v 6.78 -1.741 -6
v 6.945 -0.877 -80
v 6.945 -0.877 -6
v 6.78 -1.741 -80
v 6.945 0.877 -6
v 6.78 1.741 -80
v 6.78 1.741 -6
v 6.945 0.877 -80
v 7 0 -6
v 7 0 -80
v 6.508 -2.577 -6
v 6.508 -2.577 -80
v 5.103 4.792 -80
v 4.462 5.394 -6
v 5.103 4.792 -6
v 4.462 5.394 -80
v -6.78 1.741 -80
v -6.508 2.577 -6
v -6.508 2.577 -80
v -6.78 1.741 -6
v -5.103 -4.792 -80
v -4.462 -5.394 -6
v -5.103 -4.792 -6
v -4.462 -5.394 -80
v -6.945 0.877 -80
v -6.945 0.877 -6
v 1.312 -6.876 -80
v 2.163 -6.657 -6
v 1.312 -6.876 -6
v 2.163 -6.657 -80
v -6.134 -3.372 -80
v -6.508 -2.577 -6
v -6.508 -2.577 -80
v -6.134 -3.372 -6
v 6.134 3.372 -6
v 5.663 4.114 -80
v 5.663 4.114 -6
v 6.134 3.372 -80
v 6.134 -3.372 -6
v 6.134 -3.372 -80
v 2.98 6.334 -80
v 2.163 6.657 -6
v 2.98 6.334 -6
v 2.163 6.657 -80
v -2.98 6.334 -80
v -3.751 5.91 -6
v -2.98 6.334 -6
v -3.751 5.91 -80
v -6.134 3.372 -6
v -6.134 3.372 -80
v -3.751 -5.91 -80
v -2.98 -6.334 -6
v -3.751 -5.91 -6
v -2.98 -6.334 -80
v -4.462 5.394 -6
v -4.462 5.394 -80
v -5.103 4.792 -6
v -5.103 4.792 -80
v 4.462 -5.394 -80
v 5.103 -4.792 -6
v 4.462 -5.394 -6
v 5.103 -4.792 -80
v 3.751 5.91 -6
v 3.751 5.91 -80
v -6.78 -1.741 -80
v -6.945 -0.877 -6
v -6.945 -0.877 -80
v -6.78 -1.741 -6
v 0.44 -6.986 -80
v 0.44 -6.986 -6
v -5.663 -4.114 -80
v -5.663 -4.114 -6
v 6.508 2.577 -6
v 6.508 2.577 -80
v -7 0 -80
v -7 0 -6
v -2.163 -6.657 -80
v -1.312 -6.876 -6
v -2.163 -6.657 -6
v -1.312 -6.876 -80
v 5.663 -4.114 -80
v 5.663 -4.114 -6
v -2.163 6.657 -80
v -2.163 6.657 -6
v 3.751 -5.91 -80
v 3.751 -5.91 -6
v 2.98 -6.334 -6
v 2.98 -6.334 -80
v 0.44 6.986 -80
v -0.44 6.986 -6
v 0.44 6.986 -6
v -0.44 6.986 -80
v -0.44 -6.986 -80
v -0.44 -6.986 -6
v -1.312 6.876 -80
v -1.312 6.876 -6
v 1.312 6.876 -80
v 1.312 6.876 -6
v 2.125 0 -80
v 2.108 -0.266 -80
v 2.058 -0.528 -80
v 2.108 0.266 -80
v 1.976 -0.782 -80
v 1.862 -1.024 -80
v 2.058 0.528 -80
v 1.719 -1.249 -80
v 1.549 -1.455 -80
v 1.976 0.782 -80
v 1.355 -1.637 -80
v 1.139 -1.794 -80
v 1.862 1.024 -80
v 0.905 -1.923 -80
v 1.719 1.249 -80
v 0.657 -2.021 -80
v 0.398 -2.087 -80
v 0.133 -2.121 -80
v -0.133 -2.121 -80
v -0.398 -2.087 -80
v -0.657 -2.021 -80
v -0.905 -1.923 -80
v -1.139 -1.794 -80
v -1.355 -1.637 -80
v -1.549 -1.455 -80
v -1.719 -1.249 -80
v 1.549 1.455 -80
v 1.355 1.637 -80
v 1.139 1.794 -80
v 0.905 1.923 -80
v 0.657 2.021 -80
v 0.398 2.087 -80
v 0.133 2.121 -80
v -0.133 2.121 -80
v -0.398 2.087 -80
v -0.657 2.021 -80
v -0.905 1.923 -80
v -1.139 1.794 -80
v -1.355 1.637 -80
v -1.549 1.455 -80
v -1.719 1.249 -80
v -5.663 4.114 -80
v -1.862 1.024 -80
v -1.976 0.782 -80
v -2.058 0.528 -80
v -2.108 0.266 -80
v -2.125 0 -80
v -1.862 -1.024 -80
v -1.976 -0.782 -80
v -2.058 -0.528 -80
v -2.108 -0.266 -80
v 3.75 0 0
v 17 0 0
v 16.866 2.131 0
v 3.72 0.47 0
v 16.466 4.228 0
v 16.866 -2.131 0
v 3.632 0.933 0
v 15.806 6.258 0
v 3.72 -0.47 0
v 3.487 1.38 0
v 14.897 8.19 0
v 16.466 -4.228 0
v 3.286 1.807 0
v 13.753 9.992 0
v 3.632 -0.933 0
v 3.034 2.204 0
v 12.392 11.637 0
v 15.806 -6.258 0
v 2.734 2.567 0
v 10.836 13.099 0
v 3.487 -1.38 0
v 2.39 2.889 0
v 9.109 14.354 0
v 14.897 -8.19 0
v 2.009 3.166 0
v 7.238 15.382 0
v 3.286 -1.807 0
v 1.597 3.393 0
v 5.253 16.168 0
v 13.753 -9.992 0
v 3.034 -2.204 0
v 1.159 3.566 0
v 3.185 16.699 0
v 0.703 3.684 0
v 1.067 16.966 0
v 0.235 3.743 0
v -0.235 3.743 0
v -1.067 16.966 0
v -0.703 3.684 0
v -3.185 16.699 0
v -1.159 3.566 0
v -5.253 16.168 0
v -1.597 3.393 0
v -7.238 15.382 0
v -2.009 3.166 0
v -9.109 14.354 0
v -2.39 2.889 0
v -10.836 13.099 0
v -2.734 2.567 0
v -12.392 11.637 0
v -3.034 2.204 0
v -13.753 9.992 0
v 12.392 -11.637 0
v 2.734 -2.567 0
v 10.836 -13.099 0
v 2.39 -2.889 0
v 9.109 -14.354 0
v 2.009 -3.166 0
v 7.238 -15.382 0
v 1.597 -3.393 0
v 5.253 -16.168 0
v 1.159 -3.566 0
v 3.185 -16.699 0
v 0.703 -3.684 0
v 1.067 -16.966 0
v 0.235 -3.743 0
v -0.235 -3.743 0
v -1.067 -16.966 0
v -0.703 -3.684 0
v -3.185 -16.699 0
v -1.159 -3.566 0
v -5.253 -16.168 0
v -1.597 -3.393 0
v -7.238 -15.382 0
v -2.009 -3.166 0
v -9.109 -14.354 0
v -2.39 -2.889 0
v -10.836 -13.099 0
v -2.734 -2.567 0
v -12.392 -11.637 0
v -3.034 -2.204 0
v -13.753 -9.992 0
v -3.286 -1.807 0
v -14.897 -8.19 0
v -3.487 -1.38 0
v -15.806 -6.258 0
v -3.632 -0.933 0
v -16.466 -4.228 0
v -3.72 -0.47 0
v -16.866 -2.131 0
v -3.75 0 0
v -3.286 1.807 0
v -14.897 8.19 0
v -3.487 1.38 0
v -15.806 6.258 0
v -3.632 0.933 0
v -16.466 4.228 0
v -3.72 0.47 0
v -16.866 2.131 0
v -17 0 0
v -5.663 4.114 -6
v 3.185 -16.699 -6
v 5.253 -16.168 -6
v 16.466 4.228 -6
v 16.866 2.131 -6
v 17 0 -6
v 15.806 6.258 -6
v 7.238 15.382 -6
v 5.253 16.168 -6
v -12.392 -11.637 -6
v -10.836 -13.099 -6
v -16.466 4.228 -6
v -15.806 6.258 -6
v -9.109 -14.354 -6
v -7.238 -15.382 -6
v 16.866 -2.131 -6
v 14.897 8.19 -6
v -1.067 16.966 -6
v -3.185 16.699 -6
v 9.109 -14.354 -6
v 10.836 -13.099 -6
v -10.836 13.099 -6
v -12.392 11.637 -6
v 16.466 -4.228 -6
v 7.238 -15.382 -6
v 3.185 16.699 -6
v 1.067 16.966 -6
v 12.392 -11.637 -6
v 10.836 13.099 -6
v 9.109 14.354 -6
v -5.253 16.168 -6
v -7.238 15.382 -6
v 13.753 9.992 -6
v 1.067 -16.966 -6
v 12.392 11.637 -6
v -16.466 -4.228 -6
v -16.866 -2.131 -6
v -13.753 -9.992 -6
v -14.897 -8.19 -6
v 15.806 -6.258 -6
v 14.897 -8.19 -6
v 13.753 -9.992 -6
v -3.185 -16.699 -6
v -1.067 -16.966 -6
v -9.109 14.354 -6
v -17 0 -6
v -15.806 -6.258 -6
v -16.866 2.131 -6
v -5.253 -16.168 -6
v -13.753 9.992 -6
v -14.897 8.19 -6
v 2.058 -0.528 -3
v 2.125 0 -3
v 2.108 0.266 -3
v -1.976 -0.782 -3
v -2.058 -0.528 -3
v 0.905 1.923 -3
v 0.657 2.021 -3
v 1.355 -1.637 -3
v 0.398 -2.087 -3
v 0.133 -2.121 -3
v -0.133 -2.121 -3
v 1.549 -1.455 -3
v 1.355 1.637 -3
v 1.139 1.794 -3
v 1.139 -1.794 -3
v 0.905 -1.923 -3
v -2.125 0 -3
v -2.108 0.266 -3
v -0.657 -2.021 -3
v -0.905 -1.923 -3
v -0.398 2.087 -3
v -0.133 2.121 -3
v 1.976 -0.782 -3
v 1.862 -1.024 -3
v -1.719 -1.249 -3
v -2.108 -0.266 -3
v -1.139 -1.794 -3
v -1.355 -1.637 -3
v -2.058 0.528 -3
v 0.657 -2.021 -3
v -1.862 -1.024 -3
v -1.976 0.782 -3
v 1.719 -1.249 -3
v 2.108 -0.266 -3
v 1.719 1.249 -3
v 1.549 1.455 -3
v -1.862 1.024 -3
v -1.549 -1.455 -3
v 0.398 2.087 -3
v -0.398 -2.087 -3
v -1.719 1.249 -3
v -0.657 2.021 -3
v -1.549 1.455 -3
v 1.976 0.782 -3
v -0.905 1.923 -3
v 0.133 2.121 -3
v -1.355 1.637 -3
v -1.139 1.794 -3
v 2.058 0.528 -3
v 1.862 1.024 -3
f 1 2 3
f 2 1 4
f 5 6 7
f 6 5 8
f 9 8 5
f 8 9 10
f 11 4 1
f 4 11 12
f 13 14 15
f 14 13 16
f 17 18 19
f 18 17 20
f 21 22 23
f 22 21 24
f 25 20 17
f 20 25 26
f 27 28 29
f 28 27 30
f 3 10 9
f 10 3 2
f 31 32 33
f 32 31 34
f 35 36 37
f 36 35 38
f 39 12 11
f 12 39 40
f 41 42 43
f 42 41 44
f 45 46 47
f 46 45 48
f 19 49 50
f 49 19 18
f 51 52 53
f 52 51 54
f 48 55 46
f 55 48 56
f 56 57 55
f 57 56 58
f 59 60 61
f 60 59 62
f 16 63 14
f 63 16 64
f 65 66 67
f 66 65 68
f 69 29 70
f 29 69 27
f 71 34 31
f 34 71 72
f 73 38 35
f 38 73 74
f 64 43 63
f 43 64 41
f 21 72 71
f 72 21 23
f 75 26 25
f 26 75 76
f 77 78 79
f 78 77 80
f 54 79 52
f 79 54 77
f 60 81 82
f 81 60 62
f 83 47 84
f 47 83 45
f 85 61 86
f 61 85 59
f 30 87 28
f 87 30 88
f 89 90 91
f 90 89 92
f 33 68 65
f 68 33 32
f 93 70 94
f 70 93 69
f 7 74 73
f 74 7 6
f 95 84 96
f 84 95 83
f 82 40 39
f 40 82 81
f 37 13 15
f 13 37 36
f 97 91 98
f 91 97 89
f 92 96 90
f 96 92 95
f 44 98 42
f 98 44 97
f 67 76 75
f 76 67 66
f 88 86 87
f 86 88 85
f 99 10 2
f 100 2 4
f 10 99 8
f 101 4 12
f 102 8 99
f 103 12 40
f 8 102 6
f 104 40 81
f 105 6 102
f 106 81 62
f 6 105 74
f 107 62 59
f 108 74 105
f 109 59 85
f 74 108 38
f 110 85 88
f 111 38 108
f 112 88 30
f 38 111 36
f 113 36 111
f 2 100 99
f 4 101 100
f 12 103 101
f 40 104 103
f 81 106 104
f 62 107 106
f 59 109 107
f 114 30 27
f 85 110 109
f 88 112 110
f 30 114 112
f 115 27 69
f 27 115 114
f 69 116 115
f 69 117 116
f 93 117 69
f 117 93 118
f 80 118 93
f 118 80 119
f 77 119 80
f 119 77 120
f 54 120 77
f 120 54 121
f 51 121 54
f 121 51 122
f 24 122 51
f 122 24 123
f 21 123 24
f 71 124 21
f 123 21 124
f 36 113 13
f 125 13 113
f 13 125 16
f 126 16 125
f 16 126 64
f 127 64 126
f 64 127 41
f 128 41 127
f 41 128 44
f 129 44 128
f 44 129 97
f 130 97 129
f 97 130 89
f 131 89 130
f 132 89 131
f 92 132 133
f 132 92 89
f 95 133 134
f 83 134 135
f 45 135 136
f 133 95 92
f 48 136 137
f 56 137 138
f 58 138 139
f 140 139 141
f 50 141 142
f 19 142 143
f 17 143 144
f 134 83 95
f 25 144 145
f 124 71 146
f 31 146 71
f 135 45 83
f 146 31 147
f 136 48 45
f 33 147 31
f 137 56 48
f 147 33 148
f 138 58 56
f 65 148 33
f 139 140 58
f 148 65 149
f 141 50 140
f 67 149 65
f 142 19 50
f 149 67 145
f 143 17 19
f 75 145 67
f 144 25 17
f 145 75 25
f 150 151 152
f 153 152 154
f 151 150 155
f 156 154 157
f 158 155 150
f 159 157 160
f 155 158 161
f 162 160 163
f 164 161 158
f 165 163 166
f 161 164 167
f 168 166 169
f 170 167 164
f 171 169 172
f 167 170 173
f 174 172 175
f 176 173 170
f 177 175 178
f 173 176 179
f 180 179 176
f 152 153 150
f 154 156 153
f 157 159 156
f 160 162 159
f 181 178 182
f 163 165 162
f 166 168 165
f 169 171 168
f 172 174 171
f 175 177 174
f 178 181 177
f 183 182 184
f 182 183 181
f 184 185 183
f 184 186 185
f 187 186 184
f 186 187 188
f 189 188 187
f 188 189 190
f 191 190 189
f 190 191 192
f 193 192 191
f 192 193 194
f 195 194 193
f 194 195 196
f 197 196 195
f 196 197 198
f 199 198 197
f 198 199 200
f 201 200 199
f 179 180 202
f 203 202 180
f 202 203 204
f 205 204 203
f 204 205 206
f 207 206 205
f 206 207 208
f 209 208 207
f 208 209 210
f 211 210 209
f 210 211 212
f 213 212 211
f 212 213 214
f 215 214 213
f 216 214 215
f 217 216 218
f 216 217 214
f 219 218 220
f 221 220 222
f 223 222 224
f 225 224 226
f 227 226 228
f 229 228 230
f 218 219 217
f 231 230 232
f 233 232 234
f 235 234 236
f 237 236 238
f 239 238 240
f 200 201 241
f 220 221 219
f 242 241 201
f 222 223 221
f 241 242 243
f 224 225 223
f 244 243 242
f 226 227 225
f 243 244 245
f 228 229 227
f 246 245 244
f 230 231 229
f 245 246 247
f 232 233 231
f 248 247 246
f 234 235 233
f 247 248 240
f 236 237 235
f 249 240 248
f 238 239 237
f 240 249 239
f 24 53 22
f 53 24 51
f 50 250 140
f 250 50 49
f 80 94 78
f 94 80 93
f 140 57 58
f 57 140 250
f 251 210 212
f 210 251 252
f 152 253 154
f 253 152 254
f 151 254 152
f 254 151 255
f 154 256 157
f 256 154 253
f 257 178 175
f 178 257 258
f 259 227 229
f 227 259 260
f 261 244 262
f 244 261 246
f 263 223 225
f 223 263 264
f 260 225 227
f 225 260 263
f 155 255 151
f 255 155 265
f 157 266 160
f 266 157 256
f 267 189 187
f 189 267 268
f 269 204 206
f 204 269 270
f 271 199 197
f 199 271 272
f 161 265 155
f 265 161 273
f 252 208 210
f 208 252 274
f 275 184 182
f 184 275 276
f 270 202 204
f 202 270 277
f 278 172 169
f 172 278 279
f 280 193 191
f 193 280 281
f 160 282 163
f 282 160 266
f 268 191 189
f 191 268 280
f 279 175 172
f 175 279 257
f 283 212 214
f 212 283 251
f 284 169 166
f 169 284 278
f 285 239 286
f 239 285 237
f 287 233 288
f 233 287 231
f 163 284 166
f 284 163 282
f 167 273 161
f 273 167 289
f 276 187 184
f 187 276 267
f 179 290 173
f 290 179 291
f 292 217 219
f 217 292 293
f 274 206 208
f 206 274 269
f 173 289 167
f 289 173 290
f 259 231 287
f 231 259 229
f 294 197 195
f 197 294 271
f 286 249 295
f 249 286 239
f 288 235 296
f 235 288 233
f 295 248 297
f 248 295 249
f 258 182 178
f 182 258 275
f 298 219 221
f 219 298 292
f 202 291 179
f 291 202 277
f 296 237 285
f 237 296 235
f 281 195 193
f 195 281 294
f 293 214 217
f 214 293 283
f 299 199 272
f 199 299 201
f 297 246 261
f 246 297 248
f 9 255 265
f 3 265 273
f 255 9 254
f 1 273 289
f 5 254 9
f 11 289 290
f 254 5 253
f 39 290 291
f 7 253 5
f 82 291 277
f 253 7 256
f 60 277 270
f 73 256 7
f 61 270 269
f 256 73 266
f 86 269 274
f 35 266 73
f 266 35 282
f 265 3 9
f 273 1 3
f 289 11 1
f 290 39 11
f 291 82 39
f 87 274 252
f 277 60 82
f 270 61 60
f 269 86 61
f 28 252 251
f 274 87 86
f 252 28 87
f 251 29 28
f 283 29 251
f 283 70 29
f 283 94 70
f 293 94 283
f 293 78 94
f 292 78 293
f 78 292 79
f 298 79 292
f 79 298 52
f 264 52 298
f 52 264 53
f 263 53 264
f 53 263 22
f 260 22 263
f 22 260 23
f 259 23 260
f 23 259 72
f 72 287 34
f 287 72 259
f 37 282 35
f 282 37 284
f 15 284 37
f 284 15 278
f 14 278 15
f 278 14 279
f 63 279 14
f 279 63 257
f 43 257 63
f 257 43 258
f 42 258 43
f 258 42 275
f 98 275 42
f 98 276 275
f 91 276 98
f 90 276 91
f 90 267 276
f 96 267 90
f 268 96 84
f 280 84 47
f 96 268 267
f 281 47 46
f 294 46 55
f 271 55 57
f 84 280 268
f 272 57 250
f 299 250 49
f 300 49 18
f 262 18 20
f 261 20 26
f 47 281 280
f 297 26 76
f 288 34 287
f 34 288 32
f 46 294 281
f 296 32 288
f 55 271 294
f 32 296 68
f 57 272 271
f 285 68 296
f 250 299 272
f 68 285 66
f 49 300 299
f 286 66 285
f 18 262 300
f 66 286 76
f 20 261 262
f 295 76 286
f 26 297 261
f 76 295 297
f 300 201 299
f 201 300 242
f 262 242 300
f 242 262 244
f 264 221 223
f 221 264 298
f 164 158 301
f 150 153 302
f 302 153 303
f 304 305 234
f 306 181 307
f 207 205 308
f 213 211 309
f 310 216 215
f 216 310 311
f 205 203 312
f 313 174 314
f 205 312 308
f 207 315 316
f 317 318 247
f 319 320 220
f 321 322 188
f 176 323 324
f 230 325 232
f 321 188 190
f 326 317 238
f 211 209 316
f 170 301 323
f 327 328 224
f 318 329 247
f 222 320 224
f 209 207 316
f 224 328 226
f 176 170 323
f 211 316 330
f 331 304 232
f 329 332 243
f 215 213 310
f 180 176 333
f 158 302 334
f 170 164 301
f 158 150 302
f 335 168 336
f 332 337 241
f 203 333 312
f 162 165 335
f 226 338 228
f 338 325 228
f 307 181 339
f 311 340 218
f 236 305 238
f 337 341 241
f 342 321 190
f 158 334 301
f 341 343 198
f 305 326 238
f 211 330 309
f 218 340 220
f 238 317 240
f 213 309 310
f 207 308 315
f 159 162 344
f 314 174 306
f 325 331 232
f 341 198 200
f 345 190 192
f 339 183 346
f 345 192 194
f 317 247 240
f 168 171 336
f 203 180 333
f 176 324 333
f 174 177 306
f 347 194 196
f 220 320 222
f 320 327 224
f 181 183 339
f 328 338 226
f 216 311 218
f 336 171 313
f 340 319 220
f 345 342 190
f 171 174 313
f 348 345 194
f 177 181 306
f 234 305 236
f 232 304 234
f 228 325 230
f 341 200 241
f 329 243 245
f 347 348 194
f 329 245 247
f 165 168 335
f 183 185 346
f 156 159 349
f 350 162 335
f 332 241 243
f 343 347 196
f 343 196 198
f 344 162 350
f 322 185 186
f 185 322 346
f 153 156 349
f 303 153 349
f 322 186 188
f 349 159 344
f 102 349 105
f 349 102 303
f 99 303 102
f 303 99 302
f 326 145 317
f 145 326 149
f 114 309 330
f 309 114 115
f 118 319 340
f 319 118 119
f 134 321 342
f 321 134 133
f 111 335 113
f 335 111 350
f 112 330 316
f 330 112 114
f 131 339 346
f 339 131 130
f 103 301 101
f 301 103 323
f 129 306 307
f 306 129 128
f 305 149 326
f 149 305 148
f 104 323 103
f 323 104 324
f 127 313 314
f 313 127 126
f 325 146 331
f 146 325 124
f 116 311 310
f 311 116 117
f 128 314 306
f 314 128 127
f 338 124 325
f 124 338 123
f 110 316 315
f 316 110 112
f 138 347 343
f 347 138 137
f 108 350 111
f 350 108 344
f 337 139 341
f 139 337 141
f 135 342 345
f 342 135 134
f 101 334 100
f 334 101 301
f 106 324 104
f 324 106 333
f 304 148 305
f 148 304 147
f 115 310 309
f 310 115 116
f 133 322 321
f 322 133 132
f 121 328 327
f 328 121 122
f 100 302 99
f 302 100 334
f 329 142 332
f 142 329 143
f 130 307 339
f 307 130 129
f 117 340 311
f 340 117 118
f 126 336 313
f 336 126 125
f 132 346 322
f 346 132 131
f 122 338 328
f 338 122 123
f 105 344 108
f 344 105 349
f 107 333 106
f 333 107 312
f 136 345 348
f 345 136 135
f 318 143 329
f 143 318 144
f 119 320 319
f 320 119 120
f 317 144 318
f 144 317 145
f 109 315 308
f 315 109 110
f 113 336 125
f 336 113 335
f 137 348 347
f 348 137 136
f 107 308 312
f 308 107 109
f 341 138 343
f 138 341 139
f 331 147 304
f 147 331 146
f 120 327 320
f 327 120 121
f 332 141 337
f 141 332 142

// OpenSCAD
$fn = 50;


difference() {
	union() {
		translate(v = [0, 0, -80.0000000000]) {
			cylinder(h = 80, r = 7.0000000000);
		}
		translate(v = [0, 0, -6.0000000000]) {
			cylinder(h = 6, r = 17.0000000000);
		}
	}
	union() {
		translate(v = [0, 0, 0]) {
			rotate(a = [0, 0, 0]) {
				difference() {
					union() {
						#translate(v = [0, 0, -80.0000000000]) {
							cylinder(h = 80, r = 2.0000000000);
						}
						#translate(v = [0, 0, -3]) {
							cylinder(h = 3, r = 7.0000000000, r1 = 2.1250000000, r2 = 3.7500000000);
						}
						#translate(v = [0, 0, -80.0000000000]) {
							cylinder(h = 80, r = 2.1250000000);
						}
						#translate(v = [0, 0, -80.0000000000]) {
							cylinder(h = 80, r = 2.0000000000);
						}
					}
					union();
				}
			}
		}
	}
}
